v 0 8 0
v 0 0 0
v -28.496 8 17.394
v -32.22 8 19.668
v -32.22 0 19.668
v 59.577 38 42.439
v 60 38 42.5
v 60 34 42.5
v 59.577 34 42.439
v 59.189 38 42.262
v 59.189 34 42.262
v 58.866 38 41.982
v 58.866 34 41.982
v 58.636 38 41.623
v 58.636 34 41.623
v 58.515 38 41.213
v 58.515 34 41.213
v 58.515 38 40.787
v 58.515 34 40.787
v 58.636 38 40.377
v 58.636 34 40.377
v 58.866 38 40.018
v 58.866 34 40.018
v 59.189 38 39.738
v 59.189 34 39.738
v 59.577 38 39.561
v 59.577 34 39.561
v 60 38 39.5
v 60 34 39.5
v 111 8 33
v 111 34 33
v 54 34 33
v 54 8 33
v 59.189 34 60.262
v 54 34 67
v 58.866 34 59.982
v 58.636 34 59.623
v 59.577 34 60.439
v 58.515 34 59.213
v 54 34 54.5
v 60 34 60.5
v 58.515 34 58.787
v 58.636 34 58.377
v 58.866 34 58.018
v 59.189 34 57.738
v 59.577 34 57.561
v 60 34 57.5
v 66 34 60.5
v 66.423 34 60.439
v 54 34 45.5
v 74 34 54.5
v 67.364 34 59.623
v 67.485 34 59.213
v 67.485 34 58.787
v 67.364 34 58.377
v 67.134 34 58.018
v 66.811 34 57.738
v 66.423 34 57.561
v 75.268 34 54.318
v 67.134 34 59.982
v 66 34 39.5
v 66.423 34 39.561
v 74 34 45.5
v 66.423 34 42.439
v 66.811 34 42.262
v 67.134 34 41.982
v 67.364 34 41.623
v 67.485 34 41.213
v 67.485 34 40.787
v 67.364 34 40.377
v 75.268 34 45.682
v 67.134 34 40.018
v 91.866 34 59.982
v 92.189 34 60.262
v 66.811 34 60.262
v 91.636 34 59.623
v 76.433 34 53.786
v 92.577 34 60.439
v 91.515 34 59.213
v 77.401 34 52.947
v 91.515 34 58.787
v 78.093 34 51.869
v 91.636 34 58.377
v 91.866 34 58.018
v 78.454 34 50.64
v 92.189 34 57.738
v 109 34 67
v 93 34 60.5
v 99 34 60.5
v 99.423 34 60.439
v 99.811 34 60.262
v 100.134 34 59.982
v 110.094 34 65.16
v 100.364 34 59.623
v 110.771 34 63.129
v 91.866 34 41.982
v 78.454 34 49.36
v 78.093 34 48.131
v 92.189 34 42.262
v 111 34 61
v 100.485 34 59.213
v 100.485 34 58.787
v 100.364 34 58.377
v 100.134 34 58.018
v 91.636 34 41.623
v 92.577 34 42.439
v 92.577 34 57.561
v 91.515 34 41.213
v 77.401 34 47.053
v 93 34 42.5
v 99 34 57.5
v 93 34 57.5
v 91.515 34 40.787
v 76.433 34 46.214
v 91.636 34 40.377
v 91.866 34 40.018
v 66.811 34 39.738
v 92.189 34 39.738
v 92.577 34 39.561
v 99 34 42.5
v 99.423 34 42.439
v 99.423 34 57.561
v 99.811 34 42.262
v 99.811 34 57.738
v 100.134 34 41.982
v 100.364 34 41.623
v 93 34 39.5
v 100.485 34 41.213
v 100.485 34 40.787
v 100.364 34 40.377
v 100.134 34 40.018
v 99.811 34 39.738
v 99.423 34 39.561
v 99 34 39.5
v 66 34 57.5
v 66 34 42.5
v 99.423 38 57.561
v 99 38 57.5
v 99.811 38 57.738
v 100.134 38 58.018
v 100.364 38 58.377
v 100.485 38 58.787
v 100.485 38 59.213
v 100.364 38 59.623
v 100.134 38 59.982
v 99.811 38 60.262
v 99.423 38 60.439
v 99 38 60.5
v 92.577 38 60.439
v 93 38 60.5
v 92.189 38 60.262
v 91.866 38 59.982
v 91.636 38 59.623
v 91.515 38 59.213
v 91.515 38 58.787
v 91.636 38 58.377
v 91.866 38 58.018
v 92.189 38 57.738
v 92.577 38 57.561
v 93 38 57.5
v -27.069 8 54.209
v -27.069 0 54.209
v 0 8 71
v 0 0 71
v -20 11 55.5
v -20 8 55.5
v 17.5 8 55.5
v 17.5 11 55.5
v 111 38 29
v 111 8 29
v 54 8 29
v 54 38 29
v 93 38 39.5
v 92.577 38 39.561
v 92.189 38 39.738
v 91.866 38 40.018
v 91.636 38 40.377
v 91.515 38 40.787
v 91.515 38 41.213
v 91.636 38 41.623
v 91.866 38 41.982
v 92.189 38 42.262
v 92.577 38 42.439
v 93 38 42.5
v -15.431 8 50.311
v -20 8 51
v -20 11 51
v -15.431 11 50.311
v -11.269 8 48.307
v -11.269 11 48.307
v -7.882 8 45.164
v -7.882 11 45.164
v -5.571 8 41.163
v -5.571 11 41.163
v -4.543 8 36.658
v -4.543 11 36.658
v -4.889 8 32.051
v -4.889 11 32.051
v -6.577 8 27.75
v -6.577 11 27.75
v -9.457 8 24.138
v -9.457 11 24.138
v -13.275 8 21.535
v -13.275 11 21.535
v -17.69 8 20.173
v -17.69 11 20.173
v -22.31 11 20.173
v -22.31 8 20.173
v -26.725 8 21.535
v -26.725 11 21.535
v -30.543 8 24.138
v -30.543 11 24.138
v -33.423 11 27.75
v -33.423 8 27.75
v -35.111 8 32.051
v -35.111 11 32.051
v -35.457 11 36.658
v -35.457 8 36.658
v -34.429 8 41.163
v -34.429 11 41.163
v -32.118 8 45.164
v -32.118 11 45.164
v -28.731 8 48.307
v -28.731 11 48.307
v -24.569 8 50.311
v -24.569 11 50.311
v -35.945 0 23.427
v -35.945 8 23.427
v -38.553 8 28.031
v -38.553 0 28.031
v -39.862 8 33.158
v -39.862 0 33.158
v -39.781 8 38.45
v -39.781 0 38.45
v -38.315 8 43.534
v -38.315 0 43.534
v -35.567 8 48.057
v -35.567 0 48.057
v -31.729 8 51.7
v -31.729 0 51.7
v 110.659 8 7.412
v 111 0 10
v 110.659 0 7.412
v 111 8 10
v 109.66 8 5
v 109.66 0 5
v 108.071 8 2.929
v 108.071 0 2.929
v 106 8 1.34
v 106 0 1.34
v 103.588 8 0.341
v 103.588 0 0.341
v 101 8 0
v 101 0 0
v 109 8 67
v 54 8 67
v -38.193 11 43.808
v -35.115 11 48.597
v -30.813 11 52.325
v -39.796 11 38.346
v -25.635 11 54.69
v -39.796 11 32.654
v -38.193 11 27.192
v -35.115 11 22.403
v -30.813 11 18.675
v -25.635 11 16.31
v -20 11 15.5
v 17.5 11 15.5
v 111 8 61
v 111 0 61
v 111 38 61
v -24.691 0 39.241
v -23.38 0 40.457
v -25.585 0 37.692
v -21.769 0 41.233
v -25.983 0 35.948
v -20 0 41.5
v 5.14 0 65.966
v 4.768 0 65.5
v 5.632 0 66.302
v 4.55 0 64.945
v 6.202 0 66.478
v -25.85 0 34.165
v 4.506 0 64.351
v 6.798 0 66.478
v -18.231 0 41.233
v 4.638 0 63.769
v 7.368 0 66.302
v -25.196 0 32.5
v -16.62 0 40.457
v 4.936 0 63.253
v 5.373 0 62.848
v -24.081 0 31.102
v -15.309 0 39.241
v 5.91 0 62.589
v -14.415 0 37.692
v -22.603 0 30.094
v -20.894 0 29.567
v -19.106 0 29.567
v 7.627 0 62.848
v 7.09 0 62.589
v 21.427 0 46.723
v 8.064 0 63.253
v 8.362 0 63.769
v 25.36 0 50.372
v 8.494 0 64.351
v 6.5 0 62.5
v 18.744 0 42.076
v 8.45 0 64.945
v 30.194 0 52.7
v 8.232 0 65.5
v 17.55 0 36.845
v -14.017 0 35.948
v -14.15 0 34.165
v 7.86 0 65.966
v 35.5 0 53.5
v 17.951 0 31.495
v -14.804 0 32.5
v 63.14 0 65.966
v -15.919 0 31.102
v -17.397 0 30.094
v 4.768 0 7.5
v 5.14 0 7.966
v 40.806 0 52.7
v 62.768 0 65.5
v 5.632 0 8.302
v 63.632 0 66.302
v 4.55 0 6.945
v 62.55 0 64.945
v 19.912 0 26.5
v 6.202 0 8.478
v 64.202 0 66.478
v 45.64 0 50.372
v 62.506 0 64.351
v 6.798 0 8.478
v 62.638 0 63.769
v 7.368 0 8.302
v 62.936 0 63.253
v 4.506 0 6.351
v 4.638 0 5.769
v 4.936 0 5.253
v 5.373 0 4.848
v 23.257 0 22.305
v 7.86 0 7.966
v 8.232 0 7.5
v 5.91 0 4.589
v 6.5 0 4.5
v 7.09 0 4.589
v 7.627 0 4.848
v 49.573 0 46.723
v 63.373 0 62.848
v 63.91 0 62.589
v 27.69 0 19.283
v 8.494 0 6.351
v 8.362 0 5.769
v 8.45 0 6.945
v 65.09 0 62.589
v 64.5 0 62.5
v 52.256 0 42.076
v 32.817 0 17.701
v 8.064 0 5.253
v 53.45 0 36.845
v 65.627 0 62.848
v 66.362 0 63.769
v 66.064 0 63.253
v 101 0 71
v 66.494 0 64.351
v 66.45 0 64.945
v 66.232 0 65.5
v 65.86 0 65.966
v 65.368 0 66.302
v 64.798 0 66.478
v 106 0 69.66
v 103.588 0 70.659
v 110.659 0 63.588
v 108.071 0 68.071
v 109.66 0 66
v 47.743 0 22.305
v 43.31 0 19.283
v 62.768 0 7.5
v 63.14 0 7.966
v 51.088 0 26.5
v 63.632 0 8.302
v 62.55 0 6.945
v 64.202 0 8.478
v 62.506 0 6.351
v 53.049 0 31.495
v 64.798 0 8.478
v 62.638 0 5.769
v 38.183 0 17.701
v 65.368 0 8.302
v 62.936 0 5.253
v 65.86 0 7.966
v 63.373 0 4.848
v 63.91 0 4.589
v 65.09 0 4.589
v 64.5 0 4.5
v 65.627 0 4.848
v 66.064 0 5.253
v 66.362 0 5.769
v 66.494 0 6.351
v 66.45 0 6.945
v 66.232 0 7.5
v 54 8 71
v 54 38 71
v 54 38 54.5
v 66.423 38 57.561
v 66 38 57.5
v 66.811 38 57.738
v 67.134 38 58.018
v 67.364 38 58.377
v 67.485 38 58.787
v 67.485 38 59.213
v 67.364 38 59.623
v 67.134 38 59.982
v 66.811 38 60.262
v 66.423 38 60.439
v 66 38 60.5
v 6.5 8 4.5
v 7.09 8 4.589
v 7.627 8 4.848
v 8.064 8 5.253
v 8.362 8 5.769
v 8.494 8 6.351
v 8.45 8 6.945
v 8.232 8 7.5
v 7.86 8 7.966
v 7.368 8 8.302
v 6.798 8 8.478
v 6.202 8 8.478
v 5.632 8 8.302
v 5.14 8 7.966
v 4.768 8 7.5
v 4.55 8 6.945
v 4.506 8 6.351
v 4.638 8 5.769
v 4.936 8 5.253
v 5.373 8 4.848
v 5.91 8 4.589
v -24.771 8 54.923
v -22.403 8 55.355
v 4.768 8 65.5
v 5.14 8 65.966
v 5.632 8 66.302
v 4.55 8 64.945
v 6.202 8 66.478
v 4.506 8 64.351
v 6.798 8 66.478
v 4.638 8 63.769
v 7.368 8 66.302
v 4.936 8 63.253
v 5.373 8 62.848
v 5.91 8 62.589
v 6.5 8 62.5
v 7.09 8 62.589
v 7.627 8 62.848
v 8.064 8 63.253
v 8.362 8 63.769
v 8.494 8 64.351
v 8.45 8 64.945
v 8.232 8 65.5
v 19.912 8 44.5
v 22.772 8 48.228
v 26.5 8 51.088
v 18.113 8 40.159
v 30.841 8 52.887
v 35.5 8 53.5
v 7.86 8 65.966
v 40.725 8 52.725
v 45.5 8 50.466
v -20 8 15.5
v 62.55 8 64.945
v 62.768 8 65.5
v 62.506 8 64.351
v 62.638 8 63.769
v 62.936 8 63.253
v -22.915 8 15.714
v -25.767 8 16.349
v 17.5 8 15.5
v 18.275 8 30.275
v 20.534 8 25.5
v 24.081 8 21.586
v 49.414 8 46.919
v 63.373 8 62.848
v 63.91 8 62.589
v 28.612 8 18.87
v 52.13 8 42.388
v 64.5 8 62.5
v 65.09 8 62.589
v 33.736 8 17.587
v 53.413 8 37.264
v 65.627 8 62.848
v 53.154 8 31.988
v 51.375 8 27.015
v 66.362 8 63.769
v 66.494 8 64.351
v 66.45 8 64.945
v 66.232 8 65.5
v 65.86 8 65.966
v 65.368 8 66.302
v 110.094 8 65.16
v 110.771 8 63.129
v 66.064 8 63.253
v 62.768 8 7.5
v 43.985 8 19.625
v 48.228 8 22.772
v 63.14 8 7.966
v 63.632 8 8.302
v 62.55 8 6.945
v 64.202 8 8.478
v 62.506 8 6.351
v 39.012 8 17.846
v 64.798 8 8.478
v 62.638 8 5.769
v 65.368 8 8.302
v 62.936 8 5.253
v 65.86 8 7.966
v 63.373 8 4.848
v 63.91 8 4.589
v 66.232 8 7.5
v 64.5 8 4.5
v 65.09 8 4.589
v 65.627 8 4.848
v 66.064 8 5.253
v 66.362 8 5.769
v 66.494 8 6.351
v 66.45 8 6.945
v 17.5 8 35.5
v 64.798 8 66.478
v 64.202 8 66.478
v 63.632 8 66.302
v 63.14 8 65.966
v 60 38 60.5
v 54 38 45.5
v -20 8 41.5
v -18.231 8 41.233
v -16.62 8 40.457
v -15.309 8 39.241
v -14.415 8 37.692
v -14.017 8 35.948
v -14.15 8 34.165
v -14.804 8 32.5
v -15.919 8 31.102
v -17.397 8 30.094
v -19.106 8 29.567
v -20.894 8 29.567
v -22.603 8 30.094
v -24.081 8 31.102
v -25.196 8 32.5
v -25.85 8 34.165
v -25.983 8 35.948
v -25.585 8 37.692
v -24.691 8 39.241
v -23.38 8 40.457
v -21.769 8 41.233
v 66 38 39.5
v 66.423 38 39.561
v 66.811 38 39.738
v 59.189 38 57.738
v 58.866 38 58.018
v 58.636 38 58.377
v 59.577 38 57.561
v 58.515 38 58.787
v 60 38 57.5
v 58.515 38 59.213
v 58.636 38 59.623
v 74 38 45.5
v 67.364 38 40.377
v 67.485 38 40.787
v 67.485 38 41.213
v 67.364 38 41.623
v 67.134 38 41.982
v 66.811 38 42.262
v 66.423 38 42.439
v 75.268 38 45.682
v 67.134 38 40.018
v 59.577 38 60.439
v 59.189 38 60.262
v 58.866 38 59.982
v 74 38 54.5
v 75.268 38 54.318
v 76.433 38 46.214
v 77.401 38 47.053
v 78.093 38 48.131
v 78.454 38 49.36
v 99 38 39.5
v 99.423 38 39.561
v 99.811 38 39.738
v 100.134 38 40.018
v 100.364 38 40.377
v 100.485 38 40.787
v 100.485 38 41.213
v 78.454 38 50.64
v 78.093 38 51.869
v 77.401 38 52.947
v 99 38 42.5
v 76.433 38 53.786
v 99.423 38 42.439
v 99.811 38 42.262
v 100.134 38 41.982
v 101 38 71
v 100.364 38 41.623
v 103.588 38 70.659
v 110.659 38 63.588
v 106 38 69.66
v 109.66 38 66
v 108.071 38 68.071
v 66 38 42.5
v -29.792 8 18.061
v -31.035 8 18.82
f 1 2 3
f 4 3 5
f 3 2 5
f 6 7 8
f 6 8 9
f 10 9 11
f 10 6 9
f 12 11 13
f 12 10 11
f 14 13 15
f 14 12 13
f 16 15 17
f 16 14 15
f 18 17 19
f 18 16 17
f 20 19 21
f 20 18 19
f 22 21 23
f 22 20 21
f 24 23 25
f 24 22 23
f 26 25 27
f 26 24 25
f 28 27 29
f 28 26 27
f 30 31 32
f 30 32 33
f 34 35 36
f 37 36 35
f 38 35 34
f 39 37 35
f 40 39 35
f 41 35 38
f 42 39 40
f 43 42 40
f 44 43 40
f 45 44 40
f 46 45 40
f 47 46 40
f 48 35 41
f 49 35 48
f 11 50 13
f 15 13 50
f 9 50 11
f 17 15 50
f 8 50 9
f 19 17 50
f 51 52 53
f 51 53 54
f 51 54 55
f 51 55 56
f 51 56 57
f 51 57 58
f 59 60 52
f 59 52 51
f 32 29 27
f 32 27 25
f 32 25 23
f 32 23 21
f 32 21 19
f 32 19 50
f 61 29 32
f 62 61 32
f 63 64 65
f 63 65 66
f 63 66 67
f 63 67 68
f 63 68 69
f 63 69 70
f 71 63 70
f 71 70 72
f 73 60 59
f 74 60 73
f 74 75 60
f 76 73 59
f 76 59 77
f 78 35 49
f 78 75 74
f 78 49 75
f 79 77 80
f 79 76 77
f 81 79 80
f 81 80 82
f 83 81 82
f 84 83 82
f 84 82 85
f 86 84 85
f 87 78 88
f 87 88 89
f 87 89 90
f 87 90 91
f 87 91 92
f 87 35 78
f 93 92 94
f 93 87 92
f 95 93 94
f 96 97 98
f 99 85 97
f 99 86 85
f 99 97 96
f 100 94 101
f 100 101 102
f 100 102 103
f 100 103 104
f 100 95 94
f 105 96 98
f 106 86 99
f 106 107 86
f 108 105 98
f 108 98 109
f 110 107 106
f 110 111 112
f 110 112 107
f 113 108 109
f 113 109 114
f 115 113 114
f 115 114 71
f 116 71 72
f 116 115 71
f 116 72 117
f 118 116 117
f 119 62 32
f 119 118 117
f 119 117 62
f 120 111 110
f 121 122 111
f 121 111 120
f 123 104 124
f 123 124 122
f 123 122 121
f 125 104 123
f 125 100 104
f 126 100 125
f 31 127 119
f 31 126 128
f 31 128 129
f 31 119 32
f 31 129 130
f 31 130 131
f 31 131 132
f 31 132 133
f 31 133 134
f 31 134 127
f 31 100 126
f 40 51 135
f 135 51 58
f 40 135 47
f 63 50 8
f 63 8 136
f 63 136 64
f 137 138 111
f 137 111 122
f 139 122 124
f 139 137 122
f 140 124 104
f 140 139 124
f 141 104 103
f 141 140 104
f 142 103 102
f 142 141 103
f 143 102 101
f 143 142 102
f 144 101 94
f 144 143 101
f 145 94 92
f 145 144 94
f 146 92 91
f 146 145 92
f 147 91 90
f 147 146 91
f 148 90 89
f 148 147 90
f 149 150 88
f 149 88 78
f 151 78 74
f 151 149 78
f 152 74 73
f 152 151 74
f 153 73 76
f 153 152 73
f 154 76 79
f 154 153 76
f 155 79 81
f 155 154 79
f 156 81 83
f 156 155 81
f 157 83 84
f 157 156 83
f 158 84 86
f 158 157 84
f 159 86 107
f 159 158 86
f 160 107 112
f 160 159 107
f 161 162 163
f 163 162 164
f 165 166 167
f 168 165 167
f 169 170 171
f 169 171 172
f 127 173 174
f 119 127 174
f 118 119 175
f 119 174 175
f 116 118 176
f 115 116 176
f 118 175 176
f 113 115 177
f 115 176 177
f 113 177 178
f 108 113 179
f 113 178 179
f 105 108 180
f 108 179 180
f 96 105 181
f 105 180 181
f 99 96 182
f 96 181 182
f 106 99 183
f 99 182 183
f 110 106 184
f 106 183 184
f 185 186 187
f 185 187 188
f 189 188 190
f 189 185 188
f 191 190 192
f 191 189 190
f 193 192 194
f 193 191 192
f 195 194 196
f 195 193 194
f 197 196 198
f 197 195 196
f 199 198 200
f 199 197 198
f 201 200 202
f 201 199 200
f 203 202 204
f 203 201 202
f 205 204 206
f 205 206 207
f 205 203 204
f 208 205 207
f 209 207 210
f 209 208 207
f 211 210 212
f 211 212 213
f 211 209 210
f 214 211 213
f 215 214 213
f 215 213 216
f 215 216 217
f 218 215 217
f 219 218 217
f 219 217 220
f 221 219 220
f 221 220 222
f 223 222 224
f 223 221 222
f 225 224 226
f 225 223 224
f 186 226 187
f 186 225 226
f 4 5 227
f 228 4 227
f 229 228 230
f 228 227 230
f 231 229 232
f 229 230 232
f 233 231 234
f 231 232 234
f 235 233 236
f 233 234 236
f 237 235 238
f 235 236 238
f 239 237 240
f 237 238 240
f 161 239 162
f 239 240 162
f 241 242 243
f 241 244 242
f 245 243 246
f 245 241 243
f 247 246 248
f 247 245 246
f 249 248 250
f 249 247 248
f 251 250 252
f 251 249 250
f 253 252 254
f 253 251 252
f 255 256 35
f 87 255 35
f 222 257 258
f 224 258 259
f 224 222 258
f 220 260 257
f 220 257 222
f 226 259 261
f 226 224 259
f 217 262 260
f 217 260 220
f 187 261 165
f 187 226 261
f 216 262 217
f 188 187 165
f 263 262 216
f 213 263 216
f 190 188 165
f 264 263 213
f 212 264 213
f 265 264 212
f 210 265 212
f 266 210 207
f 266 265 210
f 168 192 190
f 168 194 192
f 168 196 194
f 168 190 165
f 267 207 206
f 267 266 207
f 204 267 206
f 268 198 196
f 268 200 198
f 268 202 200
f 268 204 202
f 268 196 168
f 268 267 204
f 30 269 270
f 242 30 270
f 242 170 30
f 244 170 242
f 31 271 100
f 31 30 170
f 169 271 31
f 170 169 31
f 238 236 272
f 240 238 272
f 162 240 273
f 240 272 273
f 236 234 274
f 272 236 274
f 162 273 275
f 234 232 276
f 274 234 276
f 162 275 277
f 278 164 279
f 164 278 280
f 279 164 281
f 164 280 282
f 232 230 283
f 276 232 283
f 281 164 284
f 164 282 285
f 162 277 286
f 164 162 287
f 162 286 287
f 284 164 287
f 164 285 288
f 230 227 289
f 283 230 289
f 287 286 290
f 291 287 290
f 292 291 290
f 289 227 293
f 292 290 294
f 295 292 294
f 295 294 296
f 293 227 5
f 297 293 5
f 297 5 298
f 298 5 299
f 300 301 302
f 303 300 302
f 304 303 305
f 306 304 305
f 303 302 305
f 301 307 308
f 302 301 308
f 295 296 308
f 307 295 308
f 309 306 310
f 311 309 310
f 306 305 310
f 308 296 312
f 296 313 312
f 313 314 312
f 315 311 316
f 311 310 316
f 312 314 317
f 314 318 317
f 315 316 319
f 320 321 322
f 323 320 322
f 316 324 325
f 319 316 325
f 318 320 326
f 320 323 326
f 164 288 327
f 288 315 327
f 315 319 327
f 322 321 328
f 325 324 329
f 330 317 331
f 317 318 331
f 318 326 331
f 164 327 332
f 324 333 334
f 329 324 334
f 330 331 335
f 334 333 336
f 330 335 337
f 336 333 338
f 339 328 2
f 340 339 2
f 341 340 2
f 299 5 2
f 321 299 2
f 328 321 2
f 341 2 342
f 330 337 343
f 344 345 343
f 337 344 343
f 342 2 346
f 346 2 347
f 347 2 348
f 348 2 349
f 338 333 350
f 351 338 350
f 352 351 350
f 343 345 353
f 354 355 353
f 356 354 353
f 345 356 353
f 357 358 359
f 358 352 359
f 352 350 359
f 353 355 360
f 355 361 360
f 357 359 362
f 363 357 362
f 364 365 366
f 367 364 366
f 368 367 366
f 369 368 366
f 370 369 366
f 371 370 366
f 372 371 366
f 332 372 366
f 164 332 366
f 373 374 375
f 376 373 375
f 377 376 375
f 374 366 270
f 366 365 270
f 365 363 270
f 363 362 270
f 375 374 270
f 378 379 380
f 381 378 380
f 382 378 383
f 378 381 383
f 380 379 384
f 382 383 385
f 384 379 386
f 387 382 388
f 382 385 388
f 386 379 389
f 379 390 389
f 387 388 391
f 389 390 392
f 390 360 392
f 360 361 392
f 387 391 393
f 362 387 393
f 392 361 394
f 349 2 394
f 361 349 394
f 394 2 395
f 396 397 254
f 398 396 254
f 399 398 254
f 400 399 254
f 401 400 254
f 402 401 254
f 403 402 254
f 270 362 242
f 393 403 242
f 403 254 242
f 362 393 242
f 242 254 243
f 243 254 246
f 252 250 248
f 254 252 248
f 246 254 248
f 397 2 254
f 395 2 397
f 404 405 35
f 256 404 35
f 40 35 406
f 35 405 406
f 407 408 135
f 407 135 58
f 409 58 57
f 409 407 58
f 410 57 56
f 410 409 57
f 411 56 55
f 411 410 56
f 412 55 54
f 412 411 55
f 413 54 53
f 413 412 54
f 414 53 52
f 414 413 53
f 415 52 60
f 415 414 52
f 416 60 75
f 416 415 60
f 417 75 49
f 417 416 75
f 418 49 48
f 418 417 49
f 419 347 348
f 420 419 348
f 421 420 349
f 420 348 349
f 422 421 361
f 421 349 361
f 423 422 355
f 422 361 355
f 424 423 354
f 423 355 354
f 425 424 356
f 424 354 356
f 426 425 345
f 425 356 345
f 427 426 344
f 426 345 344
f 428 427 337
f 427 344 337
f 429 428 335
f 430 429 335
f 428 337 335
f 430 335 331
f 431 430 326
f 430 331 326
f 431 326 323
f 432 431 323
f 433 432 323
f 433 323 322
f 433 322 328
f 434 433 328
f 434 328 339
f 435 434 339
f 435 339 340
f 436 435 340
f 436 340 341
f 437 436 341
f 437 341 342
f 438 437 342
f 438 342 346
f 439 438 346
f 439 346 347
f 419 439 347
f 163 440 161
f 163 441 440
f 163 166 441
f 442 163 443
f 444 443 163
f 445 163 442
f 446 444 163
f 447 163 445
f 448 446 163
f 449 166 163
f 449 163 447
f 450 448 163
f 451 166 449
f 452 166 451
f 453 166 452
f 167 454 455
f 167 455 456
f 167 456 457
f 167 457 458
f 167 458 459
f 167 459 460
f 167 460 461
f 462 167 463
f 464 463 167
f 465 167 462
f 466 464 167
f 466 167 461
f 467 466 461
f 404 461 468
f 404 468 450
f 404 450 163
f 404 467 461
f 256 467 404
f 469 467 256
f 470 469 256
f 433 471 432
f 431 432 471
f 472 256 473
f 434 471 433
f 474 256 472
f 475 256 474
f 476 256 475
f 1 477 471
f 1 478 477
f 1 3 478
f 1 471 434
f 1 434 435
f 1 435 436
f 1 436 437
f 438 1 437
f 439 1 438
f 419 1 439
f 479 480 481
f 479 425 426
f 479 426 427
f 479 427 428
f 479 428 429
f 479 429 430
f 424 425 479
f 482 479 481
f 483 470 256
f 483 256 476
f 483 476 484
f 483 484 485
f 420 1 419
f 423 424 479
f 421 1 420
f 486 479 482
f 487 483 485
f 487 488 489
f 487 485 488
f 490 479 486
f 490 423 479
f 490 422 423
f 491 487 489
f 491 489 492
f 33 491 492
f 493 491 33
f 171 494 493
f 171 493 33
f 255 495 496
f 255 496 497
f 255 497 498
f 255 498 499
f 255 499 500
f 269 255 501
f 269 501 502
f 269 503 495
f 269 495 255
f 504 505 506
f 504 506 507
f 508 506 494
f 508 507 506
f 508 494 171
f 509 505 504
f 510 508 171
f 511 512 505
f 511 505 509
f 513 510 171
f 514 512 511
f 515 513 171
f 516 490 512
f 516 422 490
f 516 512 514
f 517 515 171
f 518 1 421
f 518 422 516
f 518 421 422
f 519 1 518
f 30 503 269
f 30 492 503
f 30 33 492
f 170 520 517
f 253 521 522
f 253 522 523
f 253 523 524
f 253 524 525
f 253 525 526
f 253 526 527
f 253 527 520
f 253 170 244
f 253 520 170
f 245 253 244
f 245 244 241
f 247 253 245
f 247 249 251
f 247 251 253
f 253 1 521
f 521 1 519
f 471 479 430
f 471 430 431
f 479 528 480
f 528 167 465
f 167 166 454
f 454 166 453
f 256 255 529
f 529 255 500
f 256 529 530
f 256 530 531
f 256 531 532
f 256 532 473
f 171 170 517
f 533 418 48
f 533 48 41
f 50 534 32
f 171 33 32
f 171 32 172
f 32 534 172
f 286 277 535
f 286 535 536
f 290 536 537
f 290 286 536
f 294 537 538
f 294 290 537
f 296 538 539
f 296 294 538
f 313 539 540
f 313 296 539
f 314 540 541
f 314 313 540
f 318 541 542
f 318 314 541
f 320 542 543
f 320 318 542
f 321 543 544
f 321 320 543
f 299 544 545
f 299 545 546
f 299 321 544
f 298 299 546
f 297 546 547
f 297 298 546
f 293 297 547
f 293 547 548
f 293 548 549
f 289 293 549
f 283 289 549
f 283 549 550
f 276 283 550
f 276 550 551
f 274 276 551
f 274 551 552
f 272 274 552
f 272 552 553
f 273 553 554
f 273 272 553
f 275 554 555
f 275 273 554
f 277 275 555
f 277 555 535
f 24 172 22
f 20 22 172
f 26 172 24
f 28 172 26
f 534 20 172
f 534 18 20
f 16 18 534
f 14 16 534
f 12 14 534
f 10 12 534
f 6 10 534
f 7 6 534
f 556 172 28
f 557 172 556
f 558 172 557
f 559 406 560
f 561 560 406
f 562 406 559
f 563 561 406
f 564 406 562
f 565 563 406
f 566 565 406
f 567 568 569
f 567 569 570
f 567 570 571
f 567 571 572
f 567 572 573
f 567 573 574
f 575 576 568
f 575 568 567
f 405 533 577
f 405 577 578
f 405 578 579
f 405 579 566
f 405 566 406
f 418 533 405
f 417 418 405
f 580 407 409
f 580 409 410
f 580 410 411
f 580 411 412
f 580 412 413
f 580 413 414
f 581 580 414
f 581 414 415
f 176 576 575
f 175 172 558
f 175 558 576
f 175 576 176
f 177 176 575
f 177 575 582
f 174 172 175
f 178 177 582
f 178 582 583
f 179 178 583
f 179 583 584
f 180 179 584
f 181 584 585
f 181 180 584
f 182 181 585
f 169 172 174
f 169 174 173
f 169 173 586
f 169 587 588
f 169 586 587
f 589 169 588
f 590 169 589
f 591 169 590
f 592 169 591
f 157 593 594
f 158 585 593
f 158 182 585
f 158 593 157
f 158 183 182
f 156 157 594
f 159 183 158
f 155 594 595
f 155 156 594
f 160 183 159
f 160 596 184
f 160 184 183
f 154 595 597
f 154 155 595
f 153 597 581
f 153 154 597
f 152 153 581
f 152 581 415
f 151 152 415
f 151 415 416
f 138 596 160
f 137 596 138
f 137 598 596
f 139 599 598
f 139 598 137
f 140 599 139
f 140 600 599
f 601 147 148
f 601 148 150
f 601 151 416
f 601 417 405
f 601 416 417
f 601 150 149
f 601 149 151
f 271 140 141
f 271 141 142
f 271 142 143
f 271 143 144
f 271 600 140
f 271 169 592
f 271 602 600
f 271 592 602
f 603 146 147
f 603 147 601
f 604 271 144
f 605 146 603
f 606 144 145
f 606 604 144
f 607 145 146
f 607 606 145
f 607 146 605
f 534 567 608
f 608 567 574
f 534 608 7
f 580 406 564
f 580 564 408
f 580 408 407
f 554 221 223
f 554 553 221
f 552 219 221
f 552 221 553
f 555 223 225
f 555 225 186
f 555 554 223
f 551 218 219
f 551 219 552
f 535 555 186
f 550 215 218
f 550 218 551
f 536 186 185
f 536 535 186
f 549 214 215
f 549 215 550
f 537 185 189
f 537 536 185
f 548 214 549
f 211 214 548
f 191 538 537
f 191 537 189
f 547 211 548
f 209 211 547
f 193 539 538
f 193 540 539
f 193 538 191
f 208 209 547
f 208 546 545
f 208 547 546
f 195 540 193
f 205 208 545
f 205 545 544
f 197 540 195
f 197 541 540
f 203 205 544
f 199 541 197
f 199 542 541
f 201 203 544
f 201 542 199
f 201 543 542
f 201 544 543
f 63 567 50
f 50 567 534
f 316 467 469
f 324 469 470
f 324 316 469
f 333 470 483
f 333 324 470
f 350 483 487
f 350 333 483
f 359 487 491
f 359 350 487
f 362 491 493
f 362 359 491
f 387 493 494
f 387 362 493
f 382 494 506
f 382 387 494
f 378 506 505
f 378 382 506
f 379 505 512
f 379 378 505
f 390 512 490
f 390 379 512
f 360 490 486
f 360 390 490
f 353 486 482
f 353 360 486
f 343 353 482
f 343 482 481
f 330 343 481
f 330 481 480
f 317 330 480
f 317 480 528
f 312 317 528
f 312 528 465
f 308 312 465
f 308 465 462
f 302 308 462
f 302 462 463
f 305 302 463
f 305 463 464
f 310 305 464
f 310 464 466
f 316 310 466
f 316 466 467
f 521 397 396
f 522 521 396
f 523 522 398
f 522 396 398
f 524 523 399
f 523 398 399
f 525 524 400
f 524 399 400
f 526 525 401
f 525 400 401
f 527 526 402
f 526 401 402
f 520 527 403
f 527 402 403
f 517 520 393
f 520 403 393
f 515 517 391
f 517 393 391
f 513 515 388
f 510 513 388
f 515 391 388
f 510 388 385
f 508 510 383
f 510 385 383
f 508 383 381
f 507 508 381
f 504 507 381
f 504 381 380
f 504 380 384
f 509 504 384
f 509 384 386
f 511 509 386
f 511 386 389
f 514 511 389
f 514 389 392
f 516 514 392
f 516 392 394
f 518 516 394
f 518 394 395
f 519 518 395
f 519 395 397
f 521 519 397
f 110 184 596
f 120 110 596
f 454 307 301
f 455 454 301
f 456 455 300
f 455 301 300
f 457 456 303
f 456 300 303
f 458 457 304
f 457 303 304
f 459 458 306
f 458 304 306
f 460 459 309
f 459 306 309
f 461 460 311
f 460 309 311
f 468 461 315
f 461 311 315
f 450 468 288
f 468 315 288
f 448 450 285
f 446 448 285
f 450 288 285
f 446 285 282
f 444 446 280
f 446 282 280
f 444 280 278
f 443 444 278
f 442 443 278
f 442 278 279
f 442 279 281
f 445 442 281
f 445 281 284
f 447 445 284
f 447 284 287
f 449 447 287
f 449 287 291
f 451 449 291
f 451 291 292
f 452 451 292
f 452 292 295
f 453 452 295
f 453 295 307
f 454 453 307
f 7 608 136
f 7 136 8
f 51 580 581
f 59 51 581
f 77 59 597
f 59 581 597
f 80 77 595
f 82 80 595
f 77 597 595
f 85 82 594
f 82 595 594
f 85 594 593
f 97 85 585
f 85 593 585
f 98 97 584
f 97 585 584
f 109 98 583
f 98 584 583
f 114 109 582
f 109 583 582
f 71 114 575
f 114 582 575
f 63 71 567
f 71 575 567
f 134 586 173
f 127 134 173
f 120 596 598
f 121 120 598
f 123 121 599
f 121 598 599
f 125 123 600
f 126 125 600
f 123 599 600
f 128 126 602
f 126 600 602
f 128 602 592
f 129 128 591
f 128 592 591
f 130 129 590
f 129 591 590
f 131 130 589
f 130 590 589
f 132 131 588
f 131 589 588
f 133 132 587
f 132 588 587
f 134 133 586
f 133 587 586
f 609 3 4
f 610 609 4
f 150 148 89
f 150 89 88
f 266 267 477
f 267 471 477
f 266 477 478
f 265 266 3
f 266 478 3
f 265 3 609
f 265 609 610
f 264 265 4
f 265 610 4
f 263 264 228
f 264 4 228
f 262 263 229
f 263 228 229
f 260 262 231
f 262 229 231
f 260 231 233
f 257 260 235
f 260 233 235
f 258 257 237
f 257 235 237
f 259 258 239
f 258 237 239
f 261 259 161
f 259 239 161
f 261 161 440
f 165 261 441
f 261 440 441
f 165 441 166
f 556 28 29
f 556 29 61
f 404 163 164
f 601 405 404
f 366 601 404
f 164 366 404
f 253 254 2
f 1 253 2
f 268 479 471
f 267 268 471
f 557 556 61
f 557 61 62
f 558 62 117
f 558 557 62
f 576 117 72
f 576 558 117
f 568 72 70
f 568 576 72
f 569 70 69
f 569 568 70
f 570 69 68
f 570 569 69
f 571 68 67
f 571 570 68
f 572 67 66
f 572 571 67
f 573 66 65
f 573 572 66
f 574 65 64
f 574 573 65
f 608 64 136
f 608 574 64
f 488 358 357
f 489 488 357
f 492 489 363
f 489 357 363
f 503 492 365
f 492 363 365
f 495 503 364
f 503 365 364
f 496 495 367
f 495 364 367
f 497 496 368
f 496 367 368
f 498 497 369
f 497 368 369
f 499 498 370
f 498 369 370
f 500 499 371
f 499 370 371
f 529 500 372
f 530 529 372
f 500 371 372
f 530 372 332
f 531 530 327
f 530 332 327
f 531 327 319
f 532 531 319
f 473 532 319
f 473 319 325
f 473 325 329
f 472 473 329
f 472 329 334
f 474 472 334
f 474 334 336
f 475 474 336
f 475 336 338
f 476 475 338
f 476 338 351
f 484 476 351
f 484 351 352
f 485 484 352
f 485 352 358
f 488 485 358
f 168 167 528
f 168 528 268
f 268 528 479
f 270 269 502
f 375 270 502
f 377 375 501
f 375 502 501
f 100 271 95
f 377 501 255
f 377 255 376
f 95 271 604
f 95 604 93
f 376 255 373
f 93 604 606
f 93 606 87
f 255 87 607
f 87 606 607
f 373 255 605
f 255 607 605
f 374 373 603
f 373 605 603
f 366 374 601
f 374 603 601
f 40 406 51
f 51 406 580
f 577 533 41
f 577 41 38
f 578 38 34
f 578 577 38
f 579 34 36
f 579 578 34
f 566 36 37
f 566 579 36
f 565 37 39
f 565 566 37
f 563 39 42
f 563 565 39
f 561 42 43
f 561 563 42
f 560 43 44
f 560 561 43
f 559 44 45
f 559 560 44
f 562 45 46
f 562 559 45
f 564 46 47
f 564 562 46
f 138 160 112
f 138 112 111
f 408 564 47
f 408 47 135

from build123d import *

# Parameters (mm, degrees)
SKETCH1_R           = 18
SKETCH1_R_2         = 6
BOSS_EXTRUDE4_DEPTH = 8
SKETCH5_R           = 20
SKETCH5_R_2         = 15.5
BOSS_EXTRUDE5_DEPTH = 3
SKETCH6_W           = 34
SKETCH6_H           = 4
BOSS_EXTRUDE6_DEPTH = 57
CUT_EXTRUDE1_REACH  = 139.135
CUT_EXTRUDE2_REACH  = 139.135
SKETCH9_R           = 2
BOSS_EXTRUDE8_DEPTH = 3
FILLET1_R           = 10
FILLET2_R           = 10


with BuildPart() as part:
    # Sketch1 → Boss-Extrude4 (new body)
    with BuildSketch(Plane(origin=(0, 0, 0), x_dir=(1, 0, 0), z_dir=(0, 1, 0))):
        with BuildLine():
            Line((0, 0), (-32.22015265, -19.667505907))
            ThreePointArc((-32.22015265, -19.667505907), (-39.781284933, -38.449706153), (-27.069479945, -54.208887014))
            Line((-27.069479945, -54.208887014), (0, -71))
            Line((0, -71), (111, -71))
            Line((111, -71), (111, 0))
            Line((111, 0), (0, 0))
        make_face()
        with Locations(Location((35.5, -35.5, 0), (0, 0, 270))):
            Circle(SKETCH1_R, mode=Mode.SUBTRACT)
        with Locations(Location((-20, -35.5, 0), (0, 0, 270))):
            Circle(SKETCH1_R_2, mode=Mode.SUBTRACT)
    extrude(amount=BOSS_EXTRUDE4_DEPTH)

    # Sketch5 → Boss-Extrude5 (add)
    with BuildSketch(Plane(origin=(0, 8, 0), x_dir=(1, 0, 0), z_dir=(0, 1, 0))):
        with Locations(Location((-20, -35.5, 0), (0, 0, 115.138226689))):
            Circle(SKETCH5_R)
        with Locations(Location((-20, -35.5, 0), (0, 0, 270))):
            Circle(SKETCH5_R_2, mode=Mode.SUBTRACT)
    extrude(amount=BOSS_EXTRUDE5_DEPTH)

    # Sketch6 → Boss-Extrude6 (add)
    with BuildSketch(Plane(origin=(111, 0, 0), x_dir=(0, 0, -1), z_dir=(1, 0, 0))):
        Polygon((-71, 38), (-71, 8), (-67, 8), (-67, 34), (-67, 38), align=None)
        with Locations((-50, 36)):
            Rectangle(SKETCH6_W, SKETCH6_H)
        Polygon((-33, 34), (-33, 8), (-29, 8), (-29, 38), (-33, 38), align=None)
    extrude(amount=-BOSS_EXTRUDE6_DEPTH)

    # Sketch7 → Cut-Extrude1 (cut, up to next)
    with BuildSketch(Plane(origin=(0, 38, 0), x_dir=(1, 0, 0), z_dir=(0, 1, 0)), mode=Mode.PRIVATE) as cut_extrude1_sk1:
        with BuildLine():
            Line((74, -45.5), (54, -45.5))
            Line((54, -45.5), (54, -50))
            Line((54, -50), (54, -54.5))
            Line((54, -54.5), (74, -54.5))
            ThreePointArc((74, -54.5), (78.5, -50), (74, -45.5))
        make_face()
    cut_extrude1_tool1 = extrude(cut_extrude1_sk1.sketch, amount=-CUT_EXTRUDE1_REACH, mode=Mode.PRIVATE) & part.part
    # Sketch7 → Cut-Extrude1 (cut, up to next)
    with BuildSketch(Plane(origin=(0, 38, 0), x_dir=(1, 0, 0), z_dir=(0, 1, 0)), mode=Mode.PRIVATE) as cut_extrude1_sk2:
        with BuildLine():
            Line((60, -57.5), (66, -57.5))
            ThreePointArc((66, -57.5), (67.5, -59), (66, -60.5))
            Line((66, -60.5), (60, -60.5))
            ThreePointArc((60, -60.5), (58.5, -59), (60, -57.5))
        make_face()
    cut_extrude1_tool2 = extrude(cut_extrude1_sk2.sketch, amount=-CUT_EXTRUDE1_REACH, mode=Mode.PRIVATE) & part.part
    # Sketch7 → Cut-Extrude1 (cut, up to next)
    with BuildSketch(Plane(origin=(0, 38, 0), x_dir=(1, 0, 0), z_dir=(0, 1, 0)), mode=Mode.PRIVATE) as cut_extrude1_sk3:
        with BuildLine():
            Line((60, -39.5), (66, -39.5))
            ThreePointArc((66, -39.5), (67.5, -41), (66, -42.5))
            Line((66, -42.5), (60, -42.5))
            ThreePointArc((60, -42.5), (58.5, -41), (60, -39.5))
        make_face()
    cut_extrude1_tool3 = extrude(cut_extrude1_sk3.sketch, amount=-CUT_EXTRUDE1_REACH, mode=Mode.PRIVATE) & part.part
    # Sketch7 → Cut-Extrude1 (cut, up to next)
    with BuildSketch(Plane(origin=(0, 38, 0), x_dir=(1, 0, 0), z_dir=(0, 1, 0)), mode=Mode.PRIVATE) as cut_extrude1_sk4:
        with BuildLine():
            Line((93, -57.5), (99, -57.5))
            ThreePointArc((99, -57.5), (100.5, -59), (99, -60.5))
            Line((99, -60.5), (93, -60.5))
            ThreePointArc((93, -60.5), (91.5, -59), (93, -57.5))
        make_face()
    cut_extrude1_tool4 = extrude(cut_extrude1_sk4.sketch, amount=-CUT_EXTRUDE1_REACH, mode=Mode.PRIVATE) & part.part
    # Sketch7 → Cut-Extrude1 (cut, up to next)
    with BuildSketch(Plane(origin=(0, 38, 0), x_dir=(1, 0, 0), z_dir=(0, 1, 0)), mode=Mode.PRIVATE) as cut_extrude1_sk5:
        with BuildLine():
            Line((93, -42.5), (99, -42.5))
            ThreePointArc((99, -42.5), (100.5, -41), (99, -39.5))
            Line((99, -39.5), (93, -39.5))
            ThreePointArc((93, -39.5), (91.5, -41), (93, -42.5))
        make_face()
    cut_extrude1_tool5 = extrude(cut_extrude1_sk5.sketch, amount=-CUT_EXTRUDE1_REACH, mode=Mode.PRIVATE) & part.part
    add(cut_extrude1_tool1.solids().sort_by_distance((65.788578, 38, 50))[0], mode=Mode.SUBTRACT)
    add(cut_extrude1_tool2.solids().sort_by_distance((63, 38, 59))[0], mode=Mode.SUBTRACT)
    add(cut_extrude1_tool3.solids().sort_by_distance((63, 38, 41))[0], mode=Mode.SUBTRACT)
    add(cut_extrude1_tool4.solids().sort_by_distance((96, 38, 59))[0], mode=Mode.SUBTRACT)
    add(cut_extrude1_tool5.solids().sort_by_distance((96, 38, 41))[0], mode=Mode.SUBTRACT)

    # Sketch9 → Cut-Extrude2 (cut, up to next)
    with BuildSketch(Plane.XZ, mode=Mode.PRIVATE) as cut_extrude2_sk1:
        with Locations(Location((64.5, 64.5, 0), (0, 0, 270))):
            Circle(SKETCH9_R)
    cut_extrude2_tool1 = extrude(cut_extrude2_sk1.sketch, amount=-CUT_EXTRUDE2_REACH, mode=Mode.PRIVATE) & part.part
    # Sketch9 → Cut-Extrude2 (cut, up to next)
    with BuildSketch(Plane.XZ, mode=Mode.PRIVATE) as cut_extrude2_sk2:
        with Locations(Location((6.5, 64.5, 0), (0, 0, 270))):
            Circle(SKETCH9_R)
    cut_extrude2_tool2 = extrude(cut_extrude2_sk2.sketch, amount=-CUT_EXTRUDE2_REACH, mode=Mode.PRIVATE) & part.part
    # Sketch9 → Cut-Extrude2 (cut, up to next)
    with BuildSketch(Plane.XZ, mode=Mode.PRIVATE) as cut_extrude2_sk3:
        with Locations(Location((6.5, 6.5, 0), (0, 0, 270))):
            Circle(SKETCH9_R)
    cut_extrude2_tool3 = extrude(cut_extrude2_sk3.sketch, amount=-CUT_EXTRUDE2_REACH, mode=Mode.PRIVATE) & part.part
    # Sketch9 → Cut-Extrude2 (cut, up to next)
    with BuildSketch(Plane.XZ, mode=Mode.PRIVATE) as cut_extrude2_sk4:
        with Locations(Location((64.5, 6.5, 0), (0, 0, 270))):
            Circle(SKETCH9_R)
    cut_extrude2_tool4 = extrude(cut_extrude2_sk4.sketch, amount=-CUT_EXTRUDE2_REACH, mode=Mode.PRIVATE) & part.part
    add(cut_extrude2_tool1.solids().sort_by_distance((64.5, 0, 64.5))[0], mode=Mode.SUBTRACT)
    add(cut_extrude2_tool2.solids().sort_by_distance((6.5, 0, 64.5))[0], mode=Mode.SUBTRACT)
    add(cut_extrude2_tool3.solids().sort_by_distance((6.5, 0, 6.5))[0], mode=Mode.SUBTRACT)
    add(cut_extrude2_tool4.solids().sort_by_distance((64.5, 0, 6.5))[0], mode=Mode.SUBTRACT)

    # Sketch10 → Boss-Extrude8 (add)
    with BuildSketch(Plane(origin=(0, 8, 0), x_dir=(1, 0, 0), z_dir=(0, 1, 0))):
        with BuildLine():
            Line((17.5, -15.5), (-20, -15.5))
            ThreePointArc((-20, -15.5), (-5.857864376, -21.357864376), (0, -35.5))
            ThreePointArc((0, -35.5), (-5.857864376, -49.642135624), (-20, -55.5))
            Line((-20, -55.5), (17.5, -55.5))
            Line((17.5, -55.5), (17.5, -15.5))
        make_face()
    extrude(amount=BOSS_EXTRUDE8_DEPTH)

    # Fillet1
    # the kernel refuses this fillet: 10 mm, written as the material it takes off along each edge
    with BuildSketch(Plane(origin=(111, 63, 71), x_dir=(-1, 0, 0), z_dir=(0, -1, 0))) as fillet1_piece_1:
        with BuildLine():
            CenterArc((FILLET1_R, FILLET1_R), FILLET1_R, 180, 90)
            Line((0, FILLET1_R), (0, 0))
            Line((0, 0), (FILLET1_R, 0))
        make_face()
    extrude(amount=88, mode=Mode.SUBTRACT)

    # Fillet2
    fillet2_edges = [part.edges().sort_by_distance(p)[0] for p in [
        (111, 4, 0),
    ]]
    fillet(fillet2_edges, radius=FILLET2_R)


solid = part.part
